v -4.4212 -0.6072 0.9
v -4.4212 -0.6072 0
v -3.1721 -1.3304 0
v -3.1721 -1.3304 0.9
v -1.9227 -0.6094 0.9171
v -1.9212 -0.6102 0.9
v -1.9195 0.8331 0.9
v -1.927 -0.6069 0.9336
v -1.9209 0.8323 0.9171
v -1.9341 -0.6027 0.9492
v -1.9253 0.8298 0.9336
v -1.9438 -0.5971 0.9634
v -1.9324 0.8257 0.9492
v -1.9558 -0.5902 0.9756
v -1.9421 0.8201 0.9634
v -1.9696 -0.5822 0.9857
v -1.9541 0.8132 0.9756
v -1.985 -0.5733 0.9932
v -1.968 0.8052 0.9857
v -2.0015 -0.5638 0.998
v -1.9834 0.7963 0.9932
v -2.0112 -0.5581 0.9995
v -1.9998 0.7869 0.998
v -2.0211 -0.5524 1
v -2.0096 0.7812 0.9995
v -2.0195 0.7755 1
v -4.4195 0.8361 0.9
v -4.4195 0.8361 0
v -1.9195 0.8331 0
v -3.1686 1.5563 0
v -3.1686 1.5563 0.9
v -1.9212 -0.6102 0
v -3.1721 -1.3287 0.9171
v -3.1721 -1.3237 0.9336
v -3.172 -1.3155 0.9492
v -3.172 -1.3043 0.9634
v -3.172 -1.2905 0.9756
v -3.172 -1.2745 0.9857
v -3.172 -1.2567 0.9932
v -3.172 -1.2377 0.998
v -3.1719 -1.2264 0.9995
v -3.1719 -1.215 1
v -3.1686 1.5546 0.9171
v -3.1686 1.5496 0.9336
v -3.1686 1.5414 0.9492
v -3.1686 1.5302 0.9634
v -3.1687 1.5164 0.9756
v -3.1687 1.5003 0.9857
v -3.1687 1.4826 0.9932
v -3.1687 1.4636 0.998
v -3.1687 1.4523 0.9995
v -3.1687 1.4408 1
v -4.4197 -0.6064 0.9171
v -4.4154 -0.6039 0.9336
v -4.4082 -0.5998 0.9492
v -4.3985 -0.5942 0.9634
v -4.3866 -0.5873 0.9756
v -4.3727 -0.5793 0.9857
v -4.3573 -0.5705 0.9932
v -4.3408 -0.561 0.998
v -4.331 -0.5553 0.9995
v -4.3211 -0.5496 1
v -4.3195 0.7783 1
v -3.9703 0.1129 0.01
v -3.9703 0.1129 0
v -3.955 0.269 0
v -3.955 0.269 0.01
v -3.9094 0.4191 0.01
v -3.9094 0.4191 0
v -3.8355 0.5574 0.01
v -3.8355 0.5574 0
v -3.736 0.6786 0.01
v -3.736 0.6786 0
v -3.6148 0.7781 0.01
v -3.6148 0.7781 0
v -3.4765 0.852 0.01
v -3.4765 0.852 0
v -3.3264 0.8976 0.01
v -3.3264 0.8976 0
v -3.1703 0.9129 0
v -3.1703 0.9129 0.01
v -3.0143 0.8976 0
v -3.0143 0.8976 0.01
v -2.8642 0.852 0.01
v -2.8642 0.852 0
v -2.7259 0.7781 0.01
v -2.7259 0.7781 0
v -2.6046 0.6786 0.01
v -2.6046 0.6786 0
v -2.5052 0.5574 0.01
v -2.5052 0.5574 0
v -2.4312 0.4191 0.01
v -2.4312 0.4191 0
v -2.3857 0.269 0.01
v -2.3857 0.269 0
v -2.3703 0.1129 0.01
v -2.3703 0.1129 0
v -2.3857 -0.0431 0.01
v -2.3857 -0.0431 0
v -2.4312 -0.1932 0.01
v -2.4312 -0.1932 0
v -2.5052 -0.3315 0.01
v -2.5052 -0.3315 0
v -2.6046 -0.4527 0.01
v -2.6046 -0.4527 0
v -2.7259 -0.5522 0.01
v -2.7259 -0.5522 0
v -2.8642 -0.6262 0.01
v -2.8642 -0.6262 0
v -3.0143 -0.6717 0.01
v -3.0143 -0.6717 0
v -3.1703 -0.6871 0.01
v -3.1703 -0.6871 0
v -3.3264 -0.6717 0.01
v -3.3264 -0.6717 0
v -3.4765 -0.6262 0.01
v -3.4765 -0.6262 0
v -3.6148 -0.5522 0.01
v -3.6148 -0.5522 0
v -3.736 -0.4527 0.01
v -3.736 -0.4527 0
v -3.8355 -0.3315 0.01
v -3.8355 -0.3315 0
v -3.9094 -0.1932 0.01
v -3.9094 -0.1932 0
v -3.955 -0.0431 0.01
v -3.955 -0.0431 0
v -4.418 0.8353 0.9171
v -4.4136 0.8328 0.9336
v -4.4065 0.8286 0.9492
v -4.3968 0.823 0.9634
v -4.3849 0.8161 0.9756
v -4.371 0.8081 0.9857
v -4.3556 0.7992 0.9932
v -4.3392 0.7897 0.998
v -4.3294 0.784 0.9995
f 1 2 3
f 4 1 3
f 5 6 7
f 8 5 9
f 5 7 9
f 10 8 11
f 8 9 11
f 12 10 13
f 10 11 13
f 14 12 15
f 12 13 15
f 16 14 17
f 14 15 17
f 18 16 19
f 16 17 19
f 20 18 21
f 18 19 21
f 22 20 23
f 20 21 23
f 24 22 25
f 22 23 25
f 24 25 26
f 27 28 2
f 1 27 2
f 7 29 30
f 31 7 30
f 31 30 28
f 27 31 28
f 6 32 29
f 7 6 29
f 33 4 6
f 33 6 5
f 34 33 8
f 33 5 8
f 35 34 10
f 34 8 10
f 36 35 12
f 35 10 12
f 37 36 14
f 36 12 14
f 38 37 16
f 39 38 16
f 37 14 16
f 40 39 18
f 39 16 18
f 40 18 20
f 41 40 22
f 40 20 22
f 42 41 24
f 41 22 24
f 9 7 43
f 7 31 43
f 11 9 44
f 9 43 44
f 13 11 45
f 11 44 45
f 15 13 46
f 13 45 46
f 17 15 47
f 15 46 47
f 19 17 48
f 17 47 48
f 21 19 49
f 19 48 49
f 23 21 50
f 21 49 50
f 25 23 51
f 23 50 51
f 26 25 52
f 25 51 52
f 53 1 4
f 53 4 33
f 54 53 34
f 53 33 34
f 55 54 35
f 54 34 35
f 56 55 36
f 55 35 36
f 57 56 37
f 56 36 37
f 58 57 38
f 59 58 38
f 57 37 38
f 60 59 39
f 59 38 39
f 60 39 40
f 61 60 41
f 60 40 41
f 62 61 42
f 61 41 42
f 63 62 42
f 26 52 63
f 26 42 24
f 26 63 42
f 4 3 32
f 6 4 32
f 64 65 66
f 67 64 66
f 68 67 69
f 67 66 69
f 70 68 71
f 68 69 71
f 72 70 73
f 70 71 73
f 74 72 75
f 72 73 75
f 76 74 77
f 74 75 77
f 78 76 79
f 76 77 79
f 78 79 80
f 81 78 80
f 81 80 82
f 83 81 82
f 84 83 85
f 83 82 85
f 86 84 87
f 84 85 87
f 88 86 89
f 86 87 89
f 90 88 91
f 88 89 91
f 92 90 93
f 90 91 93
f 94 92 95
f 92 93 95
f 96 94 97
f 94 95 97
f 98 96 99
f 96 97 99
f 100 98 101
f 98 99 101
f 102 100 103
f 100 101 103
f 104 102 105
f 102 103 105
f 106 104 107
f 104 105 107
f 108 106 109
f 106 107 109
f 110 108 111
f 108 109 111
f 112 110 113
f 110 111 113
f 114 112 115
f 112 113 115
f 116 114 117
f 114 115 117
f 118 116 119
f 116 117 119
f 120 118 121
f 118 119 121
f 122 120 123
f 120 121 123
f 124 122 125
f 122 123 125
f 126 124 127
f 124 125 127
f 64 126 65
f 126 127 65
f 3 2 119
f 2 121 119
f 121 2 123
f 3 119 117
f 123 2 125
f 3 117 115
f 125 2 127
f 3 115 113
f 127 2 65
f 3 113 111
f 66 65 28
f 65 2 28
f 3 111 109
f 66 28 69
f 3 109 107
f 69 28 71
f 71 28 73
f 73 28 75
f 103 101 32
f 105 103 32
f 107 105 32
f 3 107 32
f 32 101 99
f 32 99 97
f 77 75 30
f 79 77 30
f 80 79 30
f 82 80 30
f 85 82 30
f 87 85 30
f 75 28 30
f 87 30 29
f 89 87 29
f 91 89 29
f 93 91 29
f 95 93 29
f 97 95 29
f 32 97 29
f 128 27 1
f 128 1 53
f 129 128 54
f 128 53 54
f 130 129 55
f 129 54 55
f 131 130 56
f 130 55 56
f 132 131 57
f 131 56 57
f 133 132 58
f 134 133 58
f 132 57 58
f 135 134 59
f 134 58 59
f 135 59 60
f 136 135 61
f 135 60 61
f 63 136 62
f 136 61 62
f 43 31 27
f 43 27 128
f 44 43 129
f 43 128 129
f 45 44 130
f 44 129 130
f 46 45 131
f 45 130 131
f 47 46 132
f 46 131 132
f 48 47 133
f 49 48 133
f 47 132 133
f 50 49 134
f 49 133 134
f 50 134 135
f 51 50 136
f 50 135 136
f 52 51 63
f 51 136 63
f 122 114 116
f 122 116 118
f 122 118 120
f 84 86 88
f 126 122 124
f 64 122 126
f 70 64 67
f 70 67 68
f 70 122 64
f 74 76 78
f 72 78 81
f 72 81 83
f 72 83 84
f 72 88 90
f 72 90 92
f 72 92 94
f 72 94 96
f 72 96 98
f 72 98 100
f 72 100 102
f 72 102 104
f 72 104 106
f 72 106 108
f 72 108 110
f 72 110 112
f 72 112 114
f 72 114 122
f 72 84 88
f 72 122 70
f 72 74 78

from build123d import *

# Parameters (mm, degrees)
BOSS_EXTRUDE1_DEPTH = 1
FILLET1_R           = 0.1
SKETCH2_R           = 0.8
CUT_EXTRUDE1_DEPTH  = 0.01


with BuildPart() as part:
    # Sketch1 → Boss-Extrude1 (new body)
    with BuildSketch(Plane.XY):
        Polygon((-1.92119998, -0.610240597), (-1.919472265, 0.833134042), (-3.168607513, 1.556317607), (-4.419470474, 0.836126532), (-4.421198189, -0.607248107), (-3.172062942, -1.330431671), align=None)
    extrude(amount=BOSS_EXTRUDE1_DEPTH)

    # Fillet1
    fillet1_edges = [part.edges().sort_by_distance(p)[0] for p in [
        (-2.544039889, 1.194725824, 1),
        (-3.794038993, 1.196222069, 1),
        (-4.420334332, 0.114439212, 1),
        (-3.796630565, -0.968839889, 1),
        (-2.546631461, -0.970336134, 1),
        (-1.920336123, 0.111446723, 1),
    ]]
    fillet(fillet1_edges, radius=FILLET1_R)

    # Sketch2 → Cut-Extrude1 (cut)
    with BuildSketch(Plane(origin=(0, 0, 0), x_dir=(-1, 0, 0), z_dir=(0, 0, -1))):
        with Locations((3.170335227, 0.112942968)):
            Circle(SKETCH2_R)
    extrude(amount=-CUT_EXTRUDE1_DEPTH, mode=Mode.SUBTRACT)


solid = part.part
